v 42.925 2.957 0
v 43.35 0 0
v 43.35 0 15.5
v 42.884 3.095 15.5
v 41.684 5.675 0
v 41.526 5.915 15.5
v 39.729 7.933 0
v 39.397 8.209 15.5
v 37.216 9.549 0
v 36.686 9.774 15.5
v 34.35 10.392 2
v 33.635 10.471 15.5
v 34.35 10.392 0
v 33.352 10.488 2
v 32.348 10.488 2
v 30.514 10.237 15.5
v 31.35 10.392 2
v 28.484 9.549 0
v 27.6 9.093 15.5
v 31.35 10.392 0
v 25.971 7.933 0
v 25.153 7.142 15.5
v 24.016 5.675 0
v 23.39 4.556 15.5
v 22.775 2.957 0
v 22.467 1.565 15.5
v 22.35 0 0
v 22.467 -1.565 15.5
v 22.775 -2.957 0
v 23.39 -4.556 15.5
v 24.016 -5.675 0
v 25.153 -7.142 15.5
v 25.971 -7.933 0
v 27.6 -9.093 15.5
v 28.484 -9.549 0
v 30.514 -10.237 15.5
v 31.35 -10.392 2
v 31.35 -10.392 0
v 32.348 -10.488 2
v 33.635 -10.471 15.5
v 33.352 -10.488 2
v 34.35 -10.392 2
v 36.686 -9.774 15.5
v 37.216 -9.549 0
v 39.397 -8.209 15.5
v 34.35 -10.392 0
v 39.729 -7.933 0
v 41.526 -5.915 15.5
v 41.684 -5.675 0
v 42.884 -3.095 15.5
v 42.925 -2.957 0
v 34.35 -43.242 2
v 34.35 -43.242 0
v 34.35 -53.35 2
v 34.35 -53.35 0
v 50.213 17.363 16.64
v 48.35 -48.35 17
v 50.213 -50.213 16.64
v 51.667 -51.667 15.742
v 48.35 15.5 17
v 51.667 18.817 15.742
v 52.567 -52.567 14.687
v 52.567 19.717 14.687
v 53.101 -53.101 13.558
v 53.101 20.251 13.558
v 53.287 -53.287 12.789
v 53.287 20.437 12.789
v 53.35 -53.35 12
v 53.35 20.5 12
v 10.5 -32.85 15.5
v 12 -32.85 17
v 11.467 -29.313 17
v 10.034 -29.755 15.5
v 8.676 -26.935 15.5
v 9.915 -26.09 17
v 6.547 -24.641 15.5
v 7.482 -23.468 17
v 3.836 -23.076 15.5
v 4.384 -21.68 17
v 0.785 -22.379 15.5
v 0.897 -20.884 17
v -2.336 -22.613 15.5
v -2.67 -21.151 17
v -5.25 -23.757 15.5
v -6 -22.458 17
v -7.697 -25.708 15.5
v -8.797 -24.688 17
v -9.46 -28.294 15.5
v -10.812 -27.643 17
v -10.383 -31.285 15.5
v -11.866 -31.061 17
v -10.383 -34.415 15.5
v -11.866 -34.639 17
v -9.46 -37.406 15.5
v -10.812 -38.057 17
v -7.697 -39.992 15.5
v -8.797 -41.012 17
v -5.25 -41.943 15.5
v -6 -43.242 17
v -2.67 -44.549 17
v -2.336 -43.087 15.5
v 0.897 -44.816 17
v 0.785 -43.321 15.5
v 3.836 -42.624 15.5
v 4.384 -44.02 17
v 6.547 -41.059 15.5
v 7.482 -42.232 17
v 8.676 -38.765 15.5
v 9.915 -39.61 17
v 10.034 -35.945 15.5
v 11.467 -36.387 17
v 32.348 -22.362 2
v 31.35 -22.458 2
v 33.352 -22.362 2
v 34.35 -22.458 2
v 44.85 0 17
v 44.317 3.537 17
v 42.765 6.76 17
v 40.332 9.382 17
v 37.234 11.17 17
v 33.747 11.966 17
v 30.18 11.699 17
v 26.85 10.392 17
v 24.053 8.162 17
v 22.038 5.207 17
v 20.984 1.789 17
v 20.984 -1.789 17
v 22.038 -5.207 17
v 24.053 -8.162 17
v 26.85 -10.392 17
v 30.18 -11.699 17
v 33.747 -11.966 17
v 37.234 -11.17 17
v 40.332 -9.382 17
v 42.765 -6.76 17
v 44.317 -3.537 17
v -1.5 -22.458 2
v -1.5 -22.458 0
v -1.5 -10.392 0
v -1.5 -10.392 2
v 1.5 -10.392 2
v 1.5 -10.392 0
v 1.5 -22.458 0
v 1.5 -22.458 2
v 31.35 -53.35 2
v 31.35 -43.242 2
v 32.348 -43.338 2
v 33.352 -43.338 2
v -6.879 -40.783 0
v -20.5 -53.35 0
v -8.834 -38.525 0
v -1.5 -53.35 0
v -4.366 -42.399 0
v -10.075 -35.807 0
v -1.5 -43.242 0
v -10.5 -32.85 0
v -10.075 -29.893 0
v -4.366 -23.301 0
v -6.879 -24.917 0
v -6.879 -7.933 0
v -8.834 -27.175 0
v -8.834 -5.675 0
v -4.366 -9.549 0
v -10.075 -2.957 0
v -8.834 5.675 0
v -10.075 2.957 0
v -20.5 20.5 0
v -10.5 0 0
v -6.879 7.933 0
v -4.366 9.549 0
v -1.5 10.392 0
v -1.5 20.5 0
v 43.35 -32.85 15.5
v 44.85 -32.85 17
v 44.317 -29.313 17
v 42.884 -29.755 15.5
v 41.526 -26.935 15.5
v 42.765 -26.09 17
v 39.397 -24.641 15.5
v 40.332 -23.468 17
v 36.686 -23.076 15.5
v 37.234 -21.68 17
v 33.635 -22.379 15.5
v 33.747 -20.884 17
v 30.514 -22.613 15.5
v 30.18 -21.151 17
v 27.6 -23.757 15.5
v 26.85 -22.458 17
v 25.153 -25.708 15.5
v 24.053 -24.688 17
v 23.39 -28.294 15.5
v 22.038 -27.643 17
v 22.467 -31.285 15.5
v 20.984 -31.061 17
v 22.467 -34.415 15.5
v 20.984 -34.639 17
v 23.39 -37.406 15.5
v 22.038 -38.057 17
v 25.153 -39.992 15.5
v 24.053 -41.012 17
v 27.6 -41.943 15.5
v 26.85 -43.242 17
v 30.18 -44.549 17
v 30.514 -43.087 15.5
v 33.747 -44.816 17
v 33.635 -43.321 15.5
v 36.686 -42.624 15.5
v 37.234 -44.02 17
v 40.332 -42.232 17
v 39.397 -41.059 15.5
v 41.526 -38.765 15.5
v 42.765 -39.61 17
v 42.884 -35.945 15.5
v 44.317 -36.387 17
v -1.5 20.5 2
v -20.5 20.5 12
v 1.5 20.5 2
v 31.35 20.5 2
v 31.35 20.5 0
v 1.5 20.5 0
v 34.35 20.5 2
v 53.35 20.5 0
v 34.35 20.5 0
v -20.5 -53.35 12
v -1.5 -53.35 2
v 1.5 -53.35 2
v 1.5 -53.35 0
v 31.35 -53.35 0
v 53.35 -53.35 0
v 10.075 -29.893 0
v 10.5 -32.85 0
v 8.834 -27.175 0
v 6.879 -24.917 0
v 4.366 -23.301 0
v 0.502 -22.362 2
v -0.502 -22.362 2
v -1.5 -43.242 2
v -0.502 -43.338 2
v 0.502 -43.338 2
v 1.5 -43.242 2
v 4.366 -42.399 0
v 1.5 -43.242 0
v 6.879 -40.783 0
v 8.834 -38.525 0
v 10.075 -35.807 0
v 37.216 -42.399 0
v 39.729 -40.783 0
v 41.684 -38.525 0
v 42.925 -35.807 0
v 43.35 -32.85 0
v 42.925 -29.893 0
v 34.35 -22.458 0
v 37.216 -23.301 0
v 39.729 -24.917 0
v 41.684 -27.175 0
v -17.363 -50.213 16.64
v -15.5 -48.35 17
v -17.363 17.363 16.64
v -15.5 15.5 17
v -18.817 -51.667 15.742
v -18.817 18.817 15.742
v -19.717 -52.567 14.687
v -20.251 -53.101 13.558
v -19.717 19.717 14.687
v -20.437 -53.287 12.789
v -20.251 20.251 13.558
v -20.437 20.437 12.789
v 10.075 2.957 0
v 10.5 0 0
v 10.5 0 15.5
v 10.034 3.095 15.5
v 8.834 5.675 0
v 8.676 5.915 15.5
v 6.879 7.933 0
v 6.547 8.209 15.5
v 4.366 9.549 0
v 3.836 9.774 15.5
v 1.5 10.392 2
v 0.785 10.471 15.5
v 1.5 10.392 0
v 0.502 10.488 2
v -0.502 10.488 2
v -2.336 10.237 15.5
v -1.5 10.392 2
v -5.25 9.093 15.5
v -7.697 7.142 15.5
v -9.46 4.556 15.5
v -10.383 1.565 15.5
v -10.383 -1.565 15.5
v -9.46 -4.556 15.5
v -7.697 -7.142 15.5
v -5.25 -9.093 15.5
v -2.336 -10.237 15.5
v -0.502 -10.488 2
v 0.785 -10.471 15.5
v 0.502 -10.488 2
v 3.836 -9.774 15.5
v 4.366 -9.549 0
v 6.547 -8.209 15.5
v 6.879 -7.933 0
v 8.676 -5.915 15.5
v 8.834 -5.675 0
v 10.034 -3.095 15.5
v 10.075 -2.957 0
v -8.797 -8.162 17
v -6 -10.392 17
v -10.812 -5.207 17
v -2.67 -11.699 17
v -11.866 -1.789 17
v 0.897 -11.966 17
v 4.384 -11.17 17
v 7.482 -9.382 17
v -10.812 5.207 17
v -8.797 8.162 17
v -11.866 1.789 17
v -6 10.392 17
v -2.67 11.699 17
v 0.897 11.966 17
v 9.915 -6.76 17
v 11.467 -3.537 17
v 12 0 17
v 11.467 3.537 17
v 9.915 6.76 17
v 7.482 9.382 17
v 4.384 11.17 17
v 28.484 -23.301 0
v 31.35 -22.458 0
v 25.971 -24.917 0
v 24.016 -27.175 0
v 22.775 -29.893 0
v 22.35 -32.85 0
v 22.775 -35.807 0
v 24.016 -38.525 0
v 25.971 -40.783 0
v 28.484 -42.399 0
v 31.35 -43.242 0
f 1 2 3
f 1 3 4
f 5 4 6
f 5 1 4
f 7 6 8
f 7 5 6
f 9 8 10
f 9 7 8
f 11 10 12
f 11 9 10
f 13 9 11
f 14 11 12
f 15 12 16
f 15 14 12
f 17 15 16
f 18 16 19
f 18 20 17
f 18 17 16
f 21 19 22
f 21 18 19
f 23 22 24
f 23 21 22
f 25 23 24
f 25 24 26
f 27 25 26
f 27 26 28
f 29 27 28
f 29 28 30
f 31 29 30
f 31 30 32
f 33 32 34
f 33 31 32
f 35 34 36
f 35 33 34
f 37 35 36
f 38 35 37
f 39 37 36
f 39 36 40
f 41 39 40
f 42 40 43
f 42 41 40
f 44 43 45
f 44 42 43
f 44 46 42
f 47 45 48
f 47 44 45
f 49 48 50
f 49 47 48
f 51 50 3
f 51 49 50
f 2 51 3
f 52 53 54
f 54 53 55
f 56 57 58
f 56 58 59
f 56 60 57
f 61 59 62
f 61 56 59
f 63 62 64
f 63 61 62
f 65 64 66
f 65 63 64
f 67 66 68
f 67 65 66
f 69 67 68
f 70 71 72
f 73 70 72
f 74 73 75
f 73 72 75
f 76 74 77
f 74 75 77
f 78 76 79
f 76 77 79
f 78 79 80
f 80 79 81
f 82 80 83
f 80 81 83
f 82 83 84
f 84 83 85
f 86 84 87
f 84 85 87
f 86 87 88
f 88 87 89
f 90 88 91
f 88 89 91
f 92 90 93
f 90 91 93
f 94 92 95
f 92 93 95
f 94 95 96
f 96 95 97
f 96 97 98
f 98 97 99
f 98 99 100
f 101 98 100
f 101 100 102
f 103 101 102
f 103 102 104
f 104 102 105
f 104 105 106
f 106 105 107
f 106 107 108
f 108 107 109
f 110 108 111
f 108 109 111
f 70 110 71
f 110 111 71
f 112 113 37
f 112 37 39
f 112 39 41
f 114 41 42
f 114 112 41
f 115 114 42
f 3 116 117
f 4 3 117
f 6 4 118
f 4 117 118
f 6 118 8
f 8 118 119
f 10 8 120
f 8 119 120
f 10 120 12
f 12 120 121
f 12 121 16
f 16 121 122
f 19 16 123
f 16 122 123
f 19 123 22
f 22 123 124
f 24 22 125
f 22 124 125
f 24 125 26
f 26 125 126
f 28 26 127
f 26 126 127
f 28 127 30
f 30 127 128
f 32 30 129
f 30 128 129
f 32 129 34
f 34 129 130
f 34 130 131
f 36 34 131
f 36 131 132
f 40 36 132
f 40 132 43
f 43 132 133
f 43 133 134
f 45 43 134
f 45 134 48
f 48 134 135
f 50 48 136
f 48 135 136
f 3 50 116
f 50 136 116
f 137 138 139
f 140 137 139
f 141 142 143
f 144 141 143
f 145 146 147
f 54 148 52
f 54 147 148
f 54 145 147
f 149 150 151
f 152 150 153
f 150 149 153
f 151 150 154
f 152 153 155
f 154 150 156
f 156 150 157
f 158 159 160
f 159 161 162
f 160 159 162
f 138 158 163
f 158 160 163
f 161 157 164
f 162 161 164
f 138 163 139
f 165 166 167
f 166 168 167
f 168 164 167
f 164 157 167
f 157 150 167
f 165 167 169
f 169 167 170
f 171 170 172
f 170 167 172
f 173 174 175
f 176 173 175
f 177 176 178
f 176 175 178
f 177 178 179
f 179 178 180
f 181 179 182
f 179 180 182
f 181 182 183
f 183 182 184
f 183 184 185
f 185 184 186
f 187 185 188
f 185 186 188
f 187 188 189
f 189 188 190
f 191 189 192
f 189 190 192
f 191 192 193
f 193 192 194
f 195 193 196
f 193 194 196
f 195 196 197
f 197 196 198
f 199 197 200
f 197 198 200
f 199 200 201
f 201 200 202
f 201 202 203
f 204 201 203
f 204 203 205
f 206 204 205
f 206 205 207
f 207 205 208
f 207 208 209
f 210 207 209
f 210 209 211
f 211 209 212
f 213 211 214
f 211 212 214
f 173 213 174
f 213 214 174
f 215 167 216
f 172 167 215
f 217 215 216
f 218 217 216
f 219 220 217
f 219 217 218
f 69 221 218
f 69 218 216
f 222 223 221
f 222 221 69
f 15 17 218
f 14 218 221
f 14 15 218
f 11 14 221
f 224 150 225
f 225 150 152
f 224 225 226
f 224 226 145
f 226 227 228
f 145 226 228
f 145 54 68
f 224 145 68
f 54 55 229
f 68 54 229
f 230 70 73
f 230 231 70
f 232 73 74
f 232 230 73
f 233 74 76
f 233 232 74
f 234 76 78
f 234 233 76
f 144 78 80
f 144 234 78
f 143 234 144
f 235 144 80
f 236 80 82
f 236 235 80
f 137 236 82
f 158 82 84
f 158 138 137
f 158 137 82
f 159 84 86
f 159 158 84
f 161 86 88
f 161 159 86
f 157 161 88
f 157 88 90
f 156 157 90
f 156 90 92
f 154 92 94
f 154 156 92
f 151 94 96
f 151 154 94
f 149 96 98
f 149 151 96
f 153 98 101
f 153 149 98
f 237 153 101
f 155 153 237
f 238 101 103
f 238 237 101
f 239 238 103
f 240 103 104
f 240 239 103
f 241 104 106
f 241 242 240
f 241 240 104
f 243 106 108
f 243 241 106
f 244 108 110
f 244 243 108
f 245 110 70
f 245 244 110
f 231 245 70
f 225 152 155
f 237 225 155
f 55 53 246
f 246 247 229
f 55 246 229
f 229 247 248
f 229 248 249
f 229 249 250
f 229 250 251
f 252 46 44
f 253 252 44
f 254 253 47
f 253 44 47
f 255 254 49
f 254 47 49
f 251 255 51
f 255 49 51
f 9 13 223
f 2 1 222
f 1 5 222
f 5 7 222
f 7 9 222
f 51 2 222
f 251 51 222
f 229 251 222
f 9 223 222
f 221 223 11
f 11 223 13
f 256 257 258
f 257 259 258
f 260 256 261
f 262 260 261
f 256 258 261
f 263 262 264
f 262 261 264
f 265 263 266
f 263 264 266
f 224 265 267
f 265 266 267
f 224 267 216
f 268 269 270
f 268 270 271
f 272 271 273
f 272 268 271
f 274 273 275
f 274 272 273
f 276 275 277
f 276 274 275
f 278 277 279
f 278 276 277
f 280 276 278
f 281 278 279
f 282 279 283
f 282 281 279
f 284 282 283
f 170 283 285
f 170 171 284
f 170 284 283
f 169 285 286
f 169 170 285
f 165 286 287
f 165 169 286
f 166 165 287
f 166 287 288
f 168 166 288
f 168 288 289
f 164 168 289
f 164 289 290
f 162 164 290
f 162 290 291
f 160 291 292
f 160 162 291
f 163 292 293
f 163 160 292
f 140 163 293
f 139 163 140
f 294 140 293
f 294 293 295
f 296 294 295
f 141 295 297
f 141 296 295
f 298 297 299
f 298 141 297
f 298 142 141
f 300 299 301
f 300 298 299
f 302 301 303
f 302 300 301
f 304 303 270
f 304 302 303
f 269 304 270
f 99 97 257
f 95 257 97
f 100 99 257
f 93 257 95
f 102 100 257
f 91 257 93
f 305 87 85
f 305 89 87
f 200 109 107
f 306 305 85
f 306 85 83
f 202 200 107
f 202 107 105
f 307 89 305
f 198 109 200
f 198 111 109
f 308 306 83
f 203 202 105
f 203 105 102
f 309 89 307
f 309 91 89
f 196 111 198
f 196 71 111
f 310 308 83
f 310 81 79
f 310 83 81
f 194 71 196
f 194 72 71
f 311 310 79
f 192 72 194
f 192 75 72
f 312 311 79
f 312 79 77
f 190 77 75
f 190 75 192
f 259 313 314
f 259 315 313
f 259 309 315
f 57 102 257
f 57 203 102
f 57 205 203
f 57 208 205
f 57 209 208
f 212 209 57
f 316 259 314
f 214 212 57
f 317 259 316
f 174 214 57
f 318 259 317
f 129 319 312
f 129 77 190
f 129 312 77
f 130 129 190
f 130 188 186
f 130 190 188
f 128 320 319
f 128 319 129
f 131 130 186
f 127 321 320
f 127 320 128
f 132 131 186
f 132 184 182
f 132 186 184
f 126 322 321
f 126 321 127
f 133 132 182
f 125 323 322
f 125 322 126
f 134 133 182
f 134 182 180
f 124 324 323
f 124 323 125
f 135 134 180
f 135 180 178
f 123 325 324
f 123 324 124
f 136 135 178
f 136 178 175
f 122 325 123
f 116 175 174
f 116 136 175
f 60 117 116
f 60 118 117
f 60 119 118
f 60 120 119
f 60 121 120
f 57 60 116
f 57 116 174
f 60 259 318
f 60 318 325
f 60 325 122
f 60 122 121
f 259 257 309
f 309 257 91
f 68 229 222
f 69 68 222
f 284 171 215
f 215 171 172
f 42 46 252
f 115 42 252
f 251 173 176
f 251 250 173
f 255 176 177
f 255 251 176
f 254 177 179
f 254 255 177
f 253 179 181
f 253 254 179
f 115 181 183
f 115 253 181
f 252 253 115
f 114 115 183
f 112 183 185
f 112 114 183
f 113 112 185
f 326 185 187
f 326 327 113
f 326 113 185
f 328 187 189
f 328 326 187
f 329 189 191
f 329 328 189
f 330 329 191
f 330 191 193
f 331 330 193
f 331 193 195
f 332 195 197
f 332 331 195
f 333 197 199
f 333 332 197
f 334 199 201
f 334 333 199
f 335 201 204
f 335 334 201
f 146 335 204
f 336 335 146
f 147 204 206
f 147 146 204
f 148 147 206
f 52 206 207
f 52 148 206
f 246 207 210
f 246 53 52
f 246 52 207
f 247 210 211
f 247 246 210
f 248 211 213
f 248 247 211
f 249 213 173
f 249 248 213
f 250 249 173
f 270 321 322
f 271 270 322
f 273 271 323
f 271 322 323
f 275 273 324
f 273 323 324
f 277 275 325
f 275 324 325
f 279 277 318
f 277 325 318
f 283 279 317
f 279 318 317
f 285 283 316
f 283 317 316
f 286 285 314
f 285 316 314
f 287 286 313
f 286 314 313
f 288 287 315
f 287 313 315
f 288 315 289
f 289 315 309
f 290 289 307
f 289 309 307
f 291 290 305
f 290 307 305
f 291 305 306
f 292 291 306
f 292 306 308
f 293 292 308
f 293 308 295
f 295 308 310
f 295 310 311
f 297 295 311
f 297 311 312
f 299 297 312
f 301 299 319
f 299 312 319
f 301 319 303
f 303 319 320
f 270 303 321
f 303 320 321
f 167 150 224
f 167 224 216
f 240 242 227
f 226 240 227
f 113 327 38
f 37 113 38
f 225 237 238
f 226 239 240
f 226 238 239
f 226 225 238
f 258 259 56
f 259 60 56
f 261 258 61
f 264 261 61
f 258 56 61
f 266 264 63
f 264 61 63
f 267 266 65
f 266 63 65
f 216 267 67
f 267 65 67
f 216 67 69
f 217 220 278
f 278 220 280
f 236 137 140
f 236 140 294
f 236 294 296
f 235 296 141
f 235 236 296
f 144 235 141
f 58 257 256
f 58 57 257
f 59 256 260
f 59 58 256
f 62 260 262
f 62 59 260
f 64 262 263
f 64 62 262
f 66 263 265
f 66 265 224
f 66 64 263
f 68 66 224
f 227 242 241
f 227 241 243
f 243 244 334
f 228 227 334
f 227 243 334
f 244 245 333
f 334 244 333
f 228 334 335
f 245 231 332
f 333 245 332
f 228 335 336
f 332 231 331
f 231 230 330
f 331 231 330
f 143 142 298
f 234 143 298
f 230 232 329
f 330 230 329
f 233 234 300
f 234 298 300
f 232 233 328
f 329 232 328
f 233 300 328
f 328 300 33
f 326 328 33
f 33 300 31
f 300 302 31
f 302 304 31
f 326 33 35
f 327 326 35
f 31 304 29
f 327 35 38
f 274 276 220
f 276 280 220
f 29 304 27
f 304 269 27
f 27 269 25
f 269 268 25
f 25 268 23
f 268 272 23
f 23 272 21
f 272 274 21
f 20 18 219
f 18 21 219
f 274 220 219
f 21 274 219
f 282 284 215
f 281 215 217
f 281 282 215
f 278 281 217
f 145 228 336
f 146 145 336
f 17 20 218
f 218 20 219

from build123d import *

# Parameters (mm, degrees)
F0_W     = 73.85
F0_H     = 73.85
F0_R     = 10.5
F1_DEPTH = 17
F2_SIZE  = 1.5
F3_R     = 5
F5_DEPTH = 2


with BuildPart() as f1:
    # F0 (on Top) → F1 (new body)
    with BuildSketch(Plane.XY):
        with Locations((16.425, -16.425)):
            Rectangle(F0_W, F0_H)
        with Locations((0, -32.85)):
            Circle(F0_R, mode=Mode.SUBTRACT)
        with Locations((32.85, -32.85)):
            Circle(F0_R, mode=Mode.SUBTRACT)
        Circle(F0_R, mode=Mode.SUBTRACT)
        with Locations((32.85, 0)):
            Circle(F0_R, mode=Mode.SUBTRACT)
    extrude(amount=F1_DEPTH)

    # F2
    f2_edges = [f1.edges().sort_by_distance(p)[0] for p in [
        (-10.5, 0, 17),
        (22.35, 0, 17),
        (22.35, -32.85, 17),
        (-10.5, -32.85, 17),
    ]]
    chamfer(f2_edges, length=F2_SIZE)

    # F3
    f3_edges = [f1.edges().sort_by_distance(p)[0] for p in [
        (16.425, -53.35, 17),
        (-20.5, -16.425, 17),
        (16.425, 20.5, 17),
        (53.35, -16.425, 17),
    ]]
    fillet(f3_edges, radius=F3_R)

    # F4 (on face) → F5 (cut)
    with BuildSketch(Plane(origin=(0, 0, 0), x_dir=(1, 0, 0), z_dir=(0, 0, -1))):
        with BuildLine():
            Line((-1.5, -10.392305), (-1.5, -20.5))
            Line((-1.5, -20.5), (1.5, -20.5))
            Line((1.5, -20.5), (1.5, -10.392305))
            ThreePointArc((1.5, -10.392305), (0, -10.5), (-1.5, -10.392305))
        make_face()
        with BuildLine():
            Line((1.5, 53.35), (-1.5, 53.35))
            Line((-1.5, 53.35), (-1.5, 43.242305))
            ThreePointArc((-1.5, 43.242305), (0, 43.35), (1.5, 43.242305))
            Line((1.5, 43.242305), (1.5, 53.35))
        make_face()
        with BuildLine():
            ThreePointArc((1.5, 43.242305), (0, 43.35), (-1.5, 43.242305))
            Line((-1.5, 43.242305), (-1.5, 22.457695))
            ThreePointArc((-1.5, 22.457695), (0, 22.35), (1.5, 22.457695))
            Line((1.5, 22.457695), (1.5, 43.242305))
        make_face()
        with BuildLine():
            ThreePointArc((1.5, 22.457695), (0, 22.35), (-1.5, 22.457695))
            Line((-1.5, 22.457695), (-1.5, 10.392305))
            ThreePointArc((-1.5, 10.392305), (0, 10.5), (1.5, 10.392305))
            Line((1.5, 10.392305), (1.5, 22.457695))
        make_face()
        with BuildLine():
            Line((34.35, 53.35), (31.35, 53.35))
            Line((31.35, 53.35), (31.35, 43.242305))
            ThreePointArc((31.35, 43.242305), (32.85, 43.35), (34.35, 43.242305))
            Line((34.35, 43.242305), (34.35, 53.35))
        make_face()
        with BuildLine():
            ThreePointArc((34.35, 22.457695), (32.85, 22.35), (31.35, 22.457695))
            Line((31.35, 22.457695), (31.35, 10.392305))
            ThreePointArc((31.35, 10.392305), (32.85, 10.5), (34.35, 10.392305))
            Line((34.35, 10.392305), (34.35, 22.457695))
        make_face()
        with BuildLine():
            ThreePointArc((34.35, 43.242305), (32.85, 43.35), (31.35, 43.242305))
            Line((31.35, 43.242305), (31.35, 22.457695))
            ThreePointArc((31.35, 22.457695), (32.85, 22.35), (34.35, 22.457695))
            Line((34.35, 22.457695), (34.35, 43.242305))
        make_face()
        with BuildLine():
            Line((31.35, -10.392305), (31.35, -20.5))
            Line((31.35, -20.5), (34.35, -20.5))
            Line((34.35, -20.5), (34.35, -10.392305))
            ThreePointArc((34.35, -10.392305), (32.85, -10.5), (31.35, -10.392305))
        make_face()
    extrude(amount=-F5_DEPTH, mode=Mode.SUBTRACT)


solid = f1.part
